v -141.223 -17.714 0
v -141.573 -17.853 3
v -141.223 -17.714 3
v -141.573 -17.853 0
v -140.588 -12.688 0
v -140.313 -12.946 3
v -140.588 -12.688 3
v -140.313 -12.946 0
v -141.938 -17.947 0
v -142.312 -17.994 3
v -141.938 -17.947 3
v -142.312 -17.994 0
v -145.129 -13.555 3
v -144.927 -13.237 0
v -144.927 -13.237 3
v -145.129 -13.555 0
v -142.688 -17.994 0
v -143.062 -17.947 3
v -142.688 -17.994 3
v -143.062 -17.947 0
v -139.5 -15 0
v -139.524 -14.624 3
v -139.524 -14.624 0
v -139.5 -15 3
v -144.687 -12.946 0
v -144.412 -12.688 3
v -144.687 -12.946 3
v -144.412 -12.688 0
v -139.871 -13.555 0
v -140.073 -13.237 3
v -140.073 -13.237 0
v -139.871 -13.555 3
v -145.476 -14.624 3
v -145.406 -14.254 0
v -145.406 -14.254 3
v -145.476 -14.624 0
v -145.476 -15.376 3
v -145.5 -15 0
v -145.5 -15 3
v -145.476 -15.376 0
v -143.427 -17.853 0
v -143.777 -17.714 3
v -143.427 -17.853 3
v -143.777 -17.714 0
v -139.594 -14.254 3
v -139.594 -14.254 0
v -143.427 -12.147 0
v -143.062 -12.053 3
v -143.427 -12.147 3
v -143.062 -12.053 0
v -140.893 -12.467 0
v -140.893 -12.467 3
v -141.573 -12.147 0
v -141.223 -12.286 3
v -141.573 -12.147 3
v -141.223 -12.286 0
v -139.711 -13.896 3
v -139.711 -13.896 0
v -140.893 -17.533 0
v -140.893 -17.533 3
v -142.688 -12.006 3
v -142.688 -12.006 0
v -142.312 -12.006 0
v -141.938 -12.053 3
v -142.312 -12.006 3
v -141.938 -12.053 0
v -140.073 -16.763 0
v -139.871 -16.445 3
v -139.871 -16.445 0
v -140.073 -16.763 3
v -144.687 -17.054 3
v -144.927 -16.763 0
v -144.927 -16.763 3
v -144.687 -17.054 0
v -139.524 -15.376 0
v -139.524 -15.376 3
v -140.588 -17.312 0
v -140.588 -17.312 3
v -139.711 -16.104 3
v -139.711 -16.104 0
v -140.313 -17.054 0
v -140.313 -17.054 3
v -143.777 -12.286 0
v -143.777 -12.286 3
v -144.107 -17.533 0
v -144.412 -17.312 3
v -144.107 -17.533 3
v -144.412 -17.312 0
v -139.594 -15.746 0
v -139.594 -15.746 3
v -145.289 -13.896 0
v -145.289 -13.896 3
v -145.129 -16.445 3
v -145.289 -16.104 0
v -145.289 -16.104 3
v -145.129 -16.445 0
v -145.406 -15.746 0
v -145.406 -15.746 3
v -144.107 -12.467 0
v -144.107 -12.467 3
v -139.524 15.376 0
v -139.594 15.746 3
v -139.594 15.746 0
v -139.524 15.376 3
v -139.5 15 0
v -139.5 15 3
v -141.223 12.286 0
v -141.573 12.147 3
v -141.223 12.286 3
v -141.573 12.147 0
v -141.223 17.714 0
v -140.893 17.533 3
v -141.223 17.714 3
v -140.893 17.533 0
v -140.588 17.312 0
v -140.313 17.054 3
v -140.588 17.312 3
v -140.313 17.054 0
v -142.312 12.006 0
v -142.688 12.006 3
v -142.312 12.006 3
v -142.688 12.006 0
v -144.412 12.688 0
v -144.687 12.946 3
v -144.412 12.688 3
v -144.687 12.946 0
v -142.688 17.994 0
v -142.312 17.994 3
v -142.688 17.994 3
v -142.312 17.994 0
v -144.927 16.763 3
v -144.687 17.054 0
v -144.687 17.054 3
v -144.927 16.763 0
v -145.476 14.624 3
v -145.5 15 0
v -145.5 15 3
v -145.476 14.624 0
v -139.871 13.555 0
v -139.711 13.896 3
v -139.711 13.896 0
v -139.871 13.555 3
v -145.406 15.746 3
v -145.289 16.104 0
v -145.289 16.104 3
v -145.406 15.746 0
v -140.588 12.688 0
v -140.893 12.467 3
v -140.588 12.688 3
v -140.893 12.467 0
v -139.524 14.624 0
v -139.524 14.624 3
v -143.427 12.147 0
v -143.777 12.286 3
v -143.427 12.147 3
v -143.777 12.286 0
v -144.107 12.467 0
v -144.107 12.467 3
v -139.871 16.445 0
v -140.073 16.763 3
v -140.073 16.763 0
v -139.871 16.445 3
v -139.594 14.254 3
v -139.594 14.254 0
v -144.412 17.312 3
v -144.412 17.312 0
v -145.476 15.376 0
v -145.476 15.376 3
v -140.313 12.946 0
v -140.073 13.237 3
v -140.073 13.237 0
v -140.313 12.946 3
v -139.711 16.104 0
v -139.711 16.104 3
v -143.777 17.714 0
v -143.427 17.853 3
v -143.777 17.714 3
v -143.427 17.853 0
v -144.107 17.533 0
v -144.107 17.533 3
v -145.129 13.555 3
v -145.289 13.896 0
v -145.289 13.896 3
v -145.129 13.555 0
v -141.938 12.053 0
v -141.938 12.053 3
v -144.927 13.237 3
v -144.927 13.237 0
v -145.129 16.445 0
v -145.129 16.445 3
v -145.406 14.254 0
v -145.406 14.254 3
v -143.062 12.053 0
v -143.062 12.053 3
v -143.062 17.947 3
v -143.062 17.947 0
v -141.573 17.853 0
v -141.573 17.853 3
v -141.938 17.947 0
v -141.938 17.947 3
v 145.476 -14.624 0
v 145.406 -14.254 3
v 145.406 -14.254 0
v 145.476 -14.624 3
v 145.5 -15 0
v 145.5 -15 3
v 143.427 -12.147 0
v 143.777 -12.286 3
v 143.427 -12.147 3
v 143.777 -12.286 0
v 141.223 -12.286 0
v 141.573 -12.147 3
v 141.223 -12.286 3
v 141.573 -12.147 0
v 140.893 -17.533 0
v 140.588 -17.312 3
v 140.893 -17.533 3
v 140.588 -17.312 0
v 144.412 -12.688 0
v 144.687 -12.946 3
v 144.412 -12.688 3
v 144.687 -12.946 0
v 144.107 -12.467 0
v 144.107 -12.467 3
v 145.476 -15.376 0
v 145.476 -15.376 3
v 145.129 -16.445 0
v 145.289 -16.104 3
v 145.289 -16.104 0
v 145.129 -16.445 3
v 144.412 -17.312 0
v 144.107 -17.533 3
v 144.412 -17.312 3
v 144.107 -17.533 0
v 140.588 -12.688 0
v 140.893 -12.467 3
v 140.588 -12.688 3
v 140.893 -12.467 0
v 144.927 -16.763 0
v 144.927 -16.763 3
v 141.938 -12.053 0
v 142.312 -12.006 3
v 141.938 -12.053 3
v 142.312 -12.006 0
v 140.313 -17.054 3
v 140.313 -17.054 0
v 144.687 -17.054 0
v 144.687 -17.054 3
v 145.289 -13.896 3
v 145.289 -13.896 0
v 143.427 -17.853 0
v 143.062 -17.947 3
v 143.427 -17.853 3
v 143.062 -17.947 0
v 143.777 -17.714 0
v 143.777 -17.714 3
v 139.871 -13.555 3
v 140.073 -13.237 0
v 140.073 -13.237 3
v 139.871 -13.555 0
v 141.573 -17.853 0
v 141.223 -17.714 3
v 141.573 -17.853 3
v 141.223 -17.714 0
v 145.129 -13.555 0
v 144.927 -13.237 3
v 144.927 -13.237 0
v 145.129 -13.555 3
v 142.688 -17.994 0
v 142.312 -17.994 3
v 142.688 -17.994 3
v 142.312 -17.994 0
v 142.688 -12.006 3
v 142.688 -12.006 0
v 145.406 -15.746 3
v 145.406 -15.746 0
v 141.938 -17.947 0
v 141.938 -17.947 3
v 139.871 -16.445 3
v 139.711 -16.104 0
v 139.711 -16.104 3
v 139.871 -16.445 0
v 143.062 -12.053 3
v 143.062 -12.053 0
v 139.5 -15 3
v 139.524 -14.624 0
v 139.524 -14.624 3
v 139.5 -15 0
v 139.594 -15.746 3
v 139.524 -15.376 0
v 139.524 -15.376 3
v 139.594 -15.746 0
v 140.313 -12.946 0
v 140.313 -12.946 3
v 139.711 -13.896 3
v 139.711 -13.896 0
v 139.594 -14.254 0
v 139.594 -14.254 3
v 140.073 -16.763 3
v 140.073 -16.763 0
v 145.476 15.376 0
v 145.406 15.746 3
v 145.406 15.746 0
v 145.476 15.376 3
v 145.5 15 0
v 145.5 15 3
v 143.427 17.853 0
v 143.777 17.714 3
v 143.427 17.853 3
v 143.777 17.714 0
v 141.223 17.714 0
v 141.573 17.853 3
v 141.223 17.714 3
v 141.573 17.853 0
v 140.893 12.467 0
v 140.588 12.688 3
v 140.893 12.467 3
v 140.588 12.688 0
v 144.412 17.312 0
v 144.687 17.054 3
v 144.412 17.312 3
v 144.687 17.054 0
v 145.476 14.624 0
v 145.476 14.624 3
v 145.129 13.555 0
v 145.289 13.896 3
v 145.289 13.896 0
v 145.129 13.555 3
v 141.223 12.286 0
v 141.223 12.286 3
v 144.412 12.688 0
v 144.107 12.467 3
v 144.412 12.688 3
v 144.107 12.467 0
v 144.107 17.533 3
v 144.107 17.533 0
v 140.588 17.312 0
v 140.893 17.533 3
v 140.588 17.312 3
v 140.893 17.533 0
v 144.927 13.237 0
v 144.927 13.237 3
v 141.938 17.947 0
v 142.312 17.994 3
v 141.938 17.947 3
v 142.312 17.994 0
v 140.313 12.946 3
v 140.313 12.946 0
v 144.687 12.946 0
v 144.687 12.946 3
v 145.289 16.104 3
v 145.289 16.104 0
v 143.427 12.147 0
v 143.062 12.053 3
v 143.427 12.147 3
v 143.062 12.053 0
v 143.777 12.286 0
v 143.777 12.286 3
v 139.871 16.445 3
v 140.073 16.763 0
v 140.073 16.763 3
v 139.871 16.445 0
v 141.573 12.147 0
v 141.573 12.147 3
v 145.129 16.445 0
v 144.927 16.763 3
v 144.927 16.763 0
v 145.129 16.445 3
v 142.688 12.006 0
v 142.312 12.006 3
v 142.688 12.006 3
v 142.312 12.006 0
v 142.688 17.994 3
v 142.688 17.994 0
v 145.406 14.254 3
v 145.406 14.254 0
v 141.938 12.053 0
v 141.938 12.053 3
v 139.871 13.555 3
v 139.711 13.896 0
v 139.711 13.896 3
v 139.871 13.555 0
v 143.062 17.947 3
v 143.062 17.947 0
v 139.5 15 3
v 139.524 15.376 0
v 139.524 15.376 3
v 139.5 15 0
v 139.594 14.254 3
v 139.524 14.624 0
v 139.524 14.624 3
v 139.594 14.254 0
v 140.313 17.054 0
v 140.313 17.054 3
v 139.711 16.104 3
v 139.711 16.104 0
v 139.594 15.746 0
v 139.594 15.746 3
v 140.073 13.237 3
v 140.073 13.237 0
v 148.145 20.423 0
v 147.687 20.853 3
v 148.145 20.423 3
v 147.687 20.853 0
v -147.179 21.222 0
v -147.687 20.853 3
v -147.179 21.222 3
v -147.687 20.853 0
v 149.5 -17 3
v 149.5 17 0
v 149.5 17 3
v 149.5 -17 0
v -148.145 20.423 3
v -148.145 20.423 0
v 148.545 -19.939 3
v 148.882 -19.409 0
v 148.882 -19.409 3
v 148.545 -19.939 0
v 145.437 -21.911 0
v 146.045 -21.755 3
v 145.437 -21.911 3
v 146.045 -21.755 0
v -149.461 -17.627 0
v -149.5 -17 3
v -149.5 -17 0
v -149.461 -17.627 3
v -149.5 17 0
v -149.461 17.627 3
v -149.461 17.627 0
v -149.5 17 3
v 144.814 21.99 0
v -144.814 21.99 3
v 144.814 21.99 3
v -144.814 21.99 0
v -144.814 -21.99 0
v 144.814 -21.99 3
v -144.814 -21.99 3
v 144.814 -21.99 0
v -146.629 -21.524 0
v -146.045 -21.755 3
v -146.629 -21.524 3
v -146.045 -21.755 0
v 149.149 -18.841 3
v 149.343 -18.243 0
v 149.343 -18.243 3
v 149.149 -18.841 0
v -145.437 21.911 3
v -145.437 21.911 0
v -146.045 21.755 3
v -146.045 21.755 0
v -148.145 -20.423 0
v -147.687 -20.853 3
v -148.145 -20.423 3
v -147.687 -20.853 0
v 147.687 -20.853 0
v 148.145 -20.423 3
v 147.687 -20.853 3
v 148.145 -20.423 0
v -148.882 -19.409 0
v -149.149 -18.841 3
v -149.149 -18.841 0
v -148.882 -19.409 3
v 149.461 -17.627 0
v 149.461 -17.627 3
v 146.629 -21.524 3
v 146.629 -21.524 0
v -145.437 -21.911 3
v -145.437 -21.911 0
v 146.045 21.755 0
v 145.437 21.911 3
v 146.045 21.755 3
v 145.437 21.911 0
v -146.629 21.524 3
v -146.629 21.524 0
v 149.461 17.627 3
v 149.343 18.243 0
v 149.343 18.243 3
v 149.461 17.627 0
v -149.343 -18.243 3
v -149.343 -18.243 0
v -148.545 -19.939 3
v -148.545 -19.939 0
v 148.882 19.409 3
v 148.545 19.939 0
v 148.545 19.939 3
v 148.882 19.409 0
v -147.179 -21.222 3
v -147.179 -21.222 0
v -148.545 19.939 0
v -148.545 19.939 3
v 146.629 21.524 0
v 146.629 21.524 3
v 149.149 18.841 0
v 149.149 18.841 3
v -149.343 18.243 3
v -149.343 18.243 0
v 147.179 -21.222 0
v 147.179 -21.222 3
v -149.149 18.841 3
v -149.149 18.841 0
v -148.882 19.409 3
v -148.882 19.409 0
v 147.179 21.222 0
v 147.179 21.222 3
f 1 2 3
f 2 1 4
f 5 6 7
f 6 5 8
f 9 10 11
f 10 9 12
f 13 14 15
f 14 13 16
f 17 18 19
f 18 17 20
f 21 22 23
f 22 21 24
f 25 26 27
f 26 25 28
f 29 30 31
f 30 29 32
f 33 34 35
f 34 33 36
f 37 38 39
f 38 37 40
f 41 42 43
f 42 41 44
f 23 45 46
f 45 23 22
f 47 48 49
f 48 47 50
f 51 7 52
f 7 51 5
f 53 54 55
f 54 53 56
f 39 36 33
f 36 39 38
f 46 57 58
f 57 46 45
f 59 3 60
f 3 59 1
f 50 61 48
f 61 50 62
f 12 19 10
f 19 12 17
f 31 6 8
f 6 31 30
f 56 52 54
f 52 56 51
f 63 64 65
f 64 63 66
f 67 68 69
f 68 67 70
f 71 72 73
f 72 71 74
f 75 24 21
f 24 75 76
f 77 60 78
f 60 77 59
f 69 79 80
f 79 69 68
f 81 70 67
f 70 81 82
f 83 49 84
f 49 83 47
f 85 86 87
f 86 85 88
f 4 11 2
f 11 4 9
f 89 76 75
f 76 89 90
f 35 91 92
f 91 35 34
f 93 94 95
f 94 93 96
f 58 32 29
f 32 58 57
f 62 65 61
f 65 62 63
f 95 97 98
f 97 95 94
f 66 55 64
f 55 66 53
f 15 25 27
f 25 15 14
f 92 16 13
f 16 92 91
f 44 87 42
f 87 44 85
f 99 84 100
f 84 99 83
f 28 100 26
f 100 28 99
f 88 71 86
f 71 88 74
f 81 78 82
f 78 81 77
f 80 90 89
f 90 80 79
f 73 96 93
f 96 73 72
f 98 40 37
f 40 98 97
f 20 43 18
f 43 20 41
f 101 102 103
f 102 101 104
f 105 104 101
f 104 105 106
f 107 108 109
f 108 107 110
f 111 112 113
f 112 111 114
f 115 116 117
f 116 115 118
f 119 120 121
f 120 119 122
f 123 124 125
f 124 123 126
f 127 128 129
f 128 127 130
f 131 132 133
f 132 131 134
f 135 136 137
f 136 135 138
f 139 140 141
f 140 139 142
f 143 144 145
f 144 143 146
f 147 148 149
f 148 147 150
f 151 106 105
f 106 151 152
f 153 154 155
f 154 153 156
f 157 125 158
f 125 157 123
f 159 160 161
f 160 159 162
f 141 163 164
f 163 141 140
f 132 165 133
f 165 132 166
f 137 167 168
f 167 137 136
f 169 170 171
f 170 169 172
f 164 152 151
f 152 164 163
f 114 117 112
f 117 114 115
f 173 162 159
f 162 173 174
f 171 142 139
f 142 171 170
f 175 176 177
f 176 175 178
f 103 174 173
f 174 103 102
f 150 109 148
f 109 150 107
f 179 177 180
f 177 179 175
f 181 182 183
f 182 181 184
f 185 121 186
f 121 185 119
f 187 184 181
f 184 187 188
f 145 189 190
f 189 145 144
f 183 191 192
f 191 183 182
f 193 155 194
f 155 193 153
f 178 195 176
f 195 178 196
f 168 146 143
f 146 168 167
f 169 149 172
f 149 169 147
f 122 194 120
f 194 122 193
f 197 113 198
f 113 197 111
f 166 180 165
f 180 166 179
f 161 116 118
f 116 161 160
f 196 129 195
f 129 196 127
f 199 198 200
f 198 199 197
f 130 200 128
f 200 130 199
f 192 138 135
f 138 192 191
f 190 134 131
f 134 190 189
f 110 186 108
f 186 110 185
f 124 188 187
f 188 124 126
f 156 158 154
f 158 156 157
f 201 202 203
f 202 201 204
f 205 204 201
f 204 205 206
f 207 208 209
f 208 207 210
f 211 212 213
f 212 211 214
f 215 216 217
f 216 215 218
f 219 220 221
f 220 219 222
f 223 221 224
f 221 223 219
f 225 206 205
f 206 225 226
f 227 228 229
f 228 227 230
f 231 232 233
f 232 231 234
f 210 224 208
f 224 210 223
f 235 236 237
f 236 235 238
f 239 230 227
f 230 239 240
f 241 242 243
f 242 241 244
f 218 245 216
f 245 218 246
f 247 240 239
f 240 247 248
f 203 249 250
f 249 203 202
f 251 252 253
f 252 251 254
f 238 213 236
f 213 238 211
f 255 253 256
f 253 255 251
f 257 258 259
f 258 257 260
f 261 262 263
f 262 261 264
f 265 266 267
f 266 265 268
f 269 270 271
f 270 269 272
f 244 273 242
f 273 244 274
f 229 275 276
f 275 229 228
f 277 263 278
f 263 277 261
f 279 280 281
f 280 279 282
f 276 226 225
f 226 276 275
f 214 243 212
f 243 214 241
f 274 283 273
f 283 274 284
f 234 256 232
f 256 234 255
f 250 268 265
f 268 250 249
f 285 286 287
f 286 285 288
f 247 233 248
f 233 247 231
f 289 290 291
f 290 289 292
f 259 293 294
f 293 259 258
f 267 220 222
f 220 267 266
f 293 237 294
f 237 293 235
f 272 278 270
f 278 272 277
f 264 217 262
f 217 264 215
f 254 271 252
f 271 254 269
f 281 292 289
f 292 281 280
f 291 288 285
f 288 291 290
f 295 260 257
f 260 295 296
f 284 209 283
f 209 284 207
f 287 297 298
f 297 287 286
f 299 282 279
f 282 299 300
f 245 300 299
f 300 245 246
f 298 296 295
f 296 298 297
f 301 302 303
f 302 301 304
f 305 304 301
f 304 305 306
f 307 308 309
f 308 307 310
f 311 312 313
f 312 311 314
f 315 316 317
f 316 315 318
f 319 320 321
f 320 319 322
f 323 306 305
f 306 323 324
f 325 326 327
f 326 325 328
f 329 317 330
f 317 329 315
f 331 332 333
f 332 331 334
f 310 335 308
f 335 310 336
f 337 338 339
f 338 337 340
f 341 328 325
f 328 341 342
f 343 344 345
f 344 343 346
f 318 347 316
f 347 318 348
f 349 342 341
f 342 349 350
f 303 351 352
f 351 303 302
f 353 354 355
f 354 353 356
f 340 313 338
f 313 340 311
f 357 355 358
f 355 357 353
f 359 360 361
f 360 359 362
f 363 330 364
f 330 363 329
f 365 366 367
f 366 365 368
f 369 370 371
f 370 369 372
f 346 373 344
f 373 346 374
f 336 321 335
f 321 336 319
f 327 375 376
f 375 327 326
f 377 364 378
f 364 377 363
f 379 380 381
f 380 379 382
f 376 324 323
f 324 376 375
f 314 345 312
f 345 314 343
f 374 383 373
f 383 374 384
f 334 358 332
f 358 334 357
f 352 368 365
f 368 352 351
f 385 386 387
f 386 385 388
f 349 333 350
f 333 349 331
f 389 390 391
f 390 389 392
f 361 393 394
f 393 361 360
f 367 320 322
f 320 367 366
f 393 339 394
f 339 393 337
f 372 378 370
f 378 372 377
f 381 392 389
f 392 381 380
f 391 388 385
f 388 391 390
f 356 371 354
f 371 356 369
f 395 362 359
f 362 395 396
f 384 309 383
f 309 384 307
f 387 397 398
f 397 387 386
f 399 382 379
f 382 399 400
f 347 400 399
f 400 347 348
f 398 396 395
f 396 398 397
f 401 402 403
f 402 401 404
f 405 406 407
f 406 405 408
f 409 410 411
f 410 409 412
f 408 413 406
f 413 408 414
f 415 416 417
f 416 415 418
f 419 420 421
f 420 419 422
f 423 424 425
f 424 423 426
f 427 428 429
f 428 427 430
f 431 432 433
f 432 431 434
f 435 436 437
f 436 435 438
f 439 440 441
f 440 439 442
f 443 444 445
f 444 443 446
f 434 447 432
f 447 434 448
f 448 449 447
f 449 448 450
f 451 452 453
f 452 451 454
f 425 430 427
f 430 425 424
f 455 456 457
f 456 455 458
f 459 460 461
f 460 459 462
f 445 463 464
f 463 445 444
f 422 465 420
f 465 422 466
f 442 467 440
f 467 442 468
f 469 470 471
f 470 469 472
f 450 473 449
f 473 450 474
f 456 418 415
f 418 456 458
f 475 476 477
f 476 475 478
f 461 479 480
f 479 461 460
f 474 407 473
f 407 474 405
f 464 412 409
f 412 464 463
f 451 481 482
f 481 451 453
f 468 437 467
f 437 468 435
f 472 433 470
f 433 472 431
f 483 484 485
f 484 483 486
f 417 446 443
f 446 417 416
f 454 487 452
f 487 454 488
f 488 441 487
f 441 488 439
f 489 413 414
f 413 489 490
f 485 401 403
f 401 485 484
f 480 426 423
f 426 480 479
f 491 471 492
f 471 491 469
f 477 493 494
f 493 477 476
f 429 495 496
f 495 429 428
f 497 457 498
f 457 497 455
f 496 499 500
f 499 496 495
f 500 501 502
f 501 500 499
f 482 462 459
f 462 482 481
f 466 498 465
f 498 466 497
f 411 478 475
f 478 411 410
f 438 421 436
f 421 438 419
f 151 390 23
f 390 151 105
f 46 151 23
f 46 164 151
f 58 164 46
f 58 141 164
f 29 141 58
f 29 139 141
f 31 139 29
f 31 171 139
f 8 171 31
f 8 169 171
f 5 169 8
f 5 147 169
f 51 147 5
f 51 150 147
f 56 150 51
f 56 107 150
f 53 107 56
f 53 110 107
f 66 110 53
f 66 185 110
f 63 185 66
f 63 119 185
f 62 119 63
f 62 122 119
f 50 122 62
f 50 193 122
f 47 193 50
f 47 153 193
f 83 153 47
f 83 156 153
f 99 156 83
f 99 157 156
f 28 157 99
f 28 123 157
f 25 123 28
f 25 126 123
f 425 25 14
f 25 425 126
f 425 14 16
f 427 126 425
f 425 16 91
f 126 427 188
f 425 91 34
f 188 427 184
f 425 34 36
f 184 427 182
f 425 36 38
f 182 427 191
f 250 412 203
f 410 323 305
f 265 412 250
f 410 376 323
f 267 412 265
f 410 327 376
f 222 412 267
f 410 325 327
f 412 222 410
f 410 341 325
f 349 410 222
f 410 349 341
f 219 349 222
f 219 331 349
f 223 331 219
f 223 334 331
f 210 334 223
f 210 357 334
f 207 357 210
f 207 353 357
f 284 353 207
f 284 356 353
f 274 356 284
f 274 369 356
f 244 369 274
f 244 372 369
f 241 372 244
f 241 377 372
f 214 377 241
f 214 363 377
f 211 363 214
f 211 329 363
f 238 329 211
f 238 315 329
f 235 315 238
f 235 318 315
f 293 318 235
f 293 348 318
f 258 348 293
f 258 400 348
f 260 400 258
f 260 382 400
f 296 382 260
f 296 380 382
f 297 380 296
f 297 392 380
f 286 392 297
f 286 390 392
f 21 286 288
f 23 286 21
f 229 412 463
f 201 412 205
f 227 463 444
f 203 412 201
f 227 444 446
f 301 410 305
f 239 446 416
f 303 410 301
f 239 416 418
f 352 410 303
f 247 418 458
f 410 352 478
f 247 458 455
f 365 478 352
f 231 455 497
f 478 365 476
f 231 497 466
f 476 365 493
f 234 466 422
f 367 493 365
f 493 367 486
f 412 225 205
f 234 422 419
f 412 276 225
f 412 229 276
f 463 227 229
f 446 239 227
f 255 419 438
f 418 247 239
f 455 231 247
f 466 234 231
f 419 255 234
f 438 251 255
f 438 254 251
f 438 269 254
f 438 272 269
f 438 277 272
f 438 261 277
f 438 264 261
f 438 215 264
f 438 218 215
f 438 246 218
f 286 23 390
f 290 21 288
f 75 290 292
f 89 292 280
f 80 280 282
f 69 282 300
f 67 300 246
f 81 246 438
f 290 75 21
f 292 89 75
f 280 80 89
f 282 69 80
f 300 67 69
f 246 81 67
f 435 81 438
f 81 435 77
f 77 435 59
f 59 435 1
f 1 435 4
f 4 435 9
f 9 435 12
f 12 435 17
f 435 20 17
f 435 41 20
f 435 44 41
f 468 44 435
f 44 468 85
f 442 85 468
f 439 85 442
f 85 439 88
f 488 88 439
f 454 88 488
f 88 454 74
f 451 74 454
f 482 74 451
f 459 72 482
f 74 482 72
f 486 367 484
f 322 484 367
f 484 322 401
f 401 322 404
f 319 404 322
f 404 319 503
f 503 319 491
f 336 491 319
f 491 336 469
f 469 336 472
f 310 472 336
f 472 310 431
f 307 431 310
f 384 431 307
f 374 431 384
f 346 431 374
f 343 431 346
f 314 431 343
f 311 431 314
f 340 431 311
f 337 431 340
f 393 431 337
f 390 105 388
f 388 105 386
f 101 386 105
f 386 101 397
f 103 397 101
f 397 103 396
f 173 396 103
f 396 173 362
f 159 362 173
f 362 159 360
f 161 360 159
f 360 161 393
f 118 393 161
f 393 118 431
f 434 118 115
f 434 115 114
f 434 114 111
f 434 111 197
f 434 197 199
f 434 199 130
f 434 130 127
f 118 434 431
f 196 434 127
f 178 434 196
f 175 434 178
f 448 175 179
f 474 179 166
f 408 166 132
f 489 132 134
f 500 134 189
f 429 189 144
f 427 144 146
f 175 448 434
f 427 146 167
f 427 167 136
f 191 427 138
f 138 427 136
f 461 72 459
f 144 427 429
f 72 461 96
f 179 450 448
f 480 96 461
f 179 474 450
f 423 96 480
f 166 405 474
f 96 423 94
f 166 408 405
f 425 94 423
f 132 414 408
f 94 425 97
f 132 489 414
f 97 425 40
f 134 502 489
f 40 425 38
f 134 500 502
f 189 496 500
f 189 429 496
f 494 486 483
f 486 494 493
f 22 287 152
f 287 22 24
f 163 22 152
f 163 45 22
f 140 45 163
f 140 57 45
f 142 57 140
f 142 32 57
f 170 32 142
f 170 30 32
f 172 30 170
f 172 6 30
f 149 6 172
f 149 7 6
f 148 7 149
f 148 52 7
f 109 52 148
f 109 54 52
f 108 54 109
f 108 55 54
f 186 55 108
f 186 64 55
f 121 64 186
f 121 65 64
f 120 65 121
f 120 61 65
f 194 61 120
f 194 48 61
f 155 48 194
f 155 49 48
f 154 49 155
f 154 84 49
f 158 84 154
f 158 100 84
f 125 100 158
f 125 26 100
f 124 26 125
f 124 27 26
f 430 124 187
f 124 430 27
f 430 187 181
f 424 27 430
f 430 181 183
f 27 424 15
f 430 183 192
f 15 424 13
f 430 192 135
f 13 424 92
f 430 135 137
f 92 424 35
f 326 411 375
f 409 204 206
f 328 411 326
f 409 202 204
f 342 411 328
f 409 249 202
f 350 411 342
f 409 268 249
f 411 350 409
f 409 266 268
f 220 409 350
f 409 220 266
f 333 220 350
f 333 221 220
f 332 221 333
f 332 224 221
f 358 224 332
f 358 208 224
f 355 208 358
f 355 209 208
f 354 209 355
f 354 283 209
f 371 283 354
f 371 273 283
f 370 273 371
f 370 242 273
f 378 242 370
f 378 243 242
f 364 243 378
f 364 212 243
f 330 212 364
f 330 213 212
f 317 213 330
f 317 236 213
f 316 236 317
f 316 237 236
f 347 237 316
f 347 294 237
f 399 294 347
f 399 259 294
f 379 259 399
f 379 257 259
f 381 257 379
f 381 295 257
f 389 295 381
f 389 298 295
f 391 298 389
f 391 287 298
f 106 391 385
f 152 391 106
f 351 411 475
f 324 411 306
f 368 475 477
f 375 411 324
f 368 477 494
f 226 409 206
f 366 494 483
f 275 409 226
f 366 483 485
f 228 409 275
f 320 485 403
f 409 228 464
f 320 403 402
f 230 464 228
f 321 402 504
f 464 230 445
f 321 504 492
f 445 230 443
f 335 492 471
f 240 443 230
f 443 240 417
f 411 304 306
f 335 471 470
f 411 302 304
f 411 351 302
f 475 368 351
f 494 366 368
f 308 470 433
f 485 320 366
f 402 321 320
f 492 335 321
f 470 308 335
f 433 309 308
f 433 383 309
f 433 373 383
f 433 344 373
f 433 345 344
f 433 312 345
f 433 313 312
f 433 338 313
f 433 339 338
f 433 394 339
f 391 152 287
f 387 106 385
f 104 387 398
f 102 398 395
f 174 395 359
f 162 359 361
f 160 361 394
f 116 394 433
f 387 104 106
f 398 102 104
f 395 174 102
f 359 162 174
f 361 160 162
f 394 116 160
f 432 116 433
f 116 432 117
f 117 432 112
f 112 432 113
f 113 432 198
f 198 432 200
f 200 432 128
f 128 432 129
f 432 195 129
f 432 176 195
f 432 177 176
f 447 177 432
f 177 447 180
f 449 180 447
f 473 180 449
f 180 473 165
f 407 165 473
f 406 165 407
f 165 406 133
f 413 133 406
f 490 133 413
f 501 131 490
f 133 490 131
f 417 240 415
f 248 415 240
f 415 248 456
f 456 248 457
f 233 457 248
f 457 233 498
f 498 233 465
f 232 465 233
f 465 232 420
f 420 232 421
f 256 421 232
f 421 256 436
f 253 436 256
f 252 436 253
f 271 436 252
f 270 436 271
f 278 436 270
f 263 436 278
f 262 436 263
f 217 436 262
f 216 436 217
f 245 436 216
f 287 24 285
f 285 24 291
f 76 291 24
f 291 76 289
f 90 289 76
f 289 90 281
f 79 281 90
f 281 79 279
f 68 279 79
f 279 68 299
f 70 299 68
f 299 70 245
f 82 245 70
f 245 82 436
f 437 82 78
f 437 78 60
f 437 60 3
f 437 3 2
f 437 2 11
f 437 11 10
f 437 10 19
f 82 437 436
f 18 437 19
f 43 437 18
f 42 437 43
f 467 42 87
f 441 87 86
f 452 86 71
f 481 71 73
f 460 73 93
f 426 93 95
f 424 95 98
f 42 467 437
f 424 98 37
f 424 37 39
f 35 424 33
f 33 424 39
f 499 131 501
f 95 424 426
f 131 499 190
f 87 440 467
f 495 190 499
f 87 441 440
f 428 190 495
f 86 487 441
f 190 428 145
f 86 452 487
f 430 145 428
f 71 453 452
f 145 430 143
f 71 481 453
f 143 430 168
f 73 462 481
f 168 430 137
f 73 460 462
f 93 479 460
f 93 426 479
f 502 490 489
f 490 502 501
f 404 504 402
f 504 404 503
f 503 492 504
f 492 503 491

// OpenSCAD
$fn = 50;


difference() {
	union() {
		hull() {
			translate(v = [-144.5000000000, 17.0000000000, 0]) {
				cylinder(h = 3, r = 5);
			}
			translate(v = [144.5000000000, 17.0000000000, 0]) {
				cylinder(h = 3, r = 5);
			}
			translate(v = [-144.5000000000, -17.0000000000, 0]) {
				cylinder(h = 3, r = 5);
			}
			translate(v = [144.5000000000, -17.0000000000, 0]) {
				cylinder(h = 3, r = 5);
			}
		}
	}
	union() {
		translate(v = [-142.5000000000, -15.0000000000, -100.0000000000]) {
			cylinder(h = 200, r = 3.0000000000);
		}
		translate(v = [-142.5000000000, 15.0000000000, -100.0000000000]) {
			cylinder(h = 200, r = 3.0000000000);
		}
		translate(v = [142.5000000000, -15.0000000000, -100.0000000000]) {
			cylinder(h = 200, r = 3.0000000000);
		}
		translate(v = [142.5000000000, 15.0000000000, -100.0000000000]) {
			cylinder(h = 200, r = 3.0000000000);
		}
	}
}
